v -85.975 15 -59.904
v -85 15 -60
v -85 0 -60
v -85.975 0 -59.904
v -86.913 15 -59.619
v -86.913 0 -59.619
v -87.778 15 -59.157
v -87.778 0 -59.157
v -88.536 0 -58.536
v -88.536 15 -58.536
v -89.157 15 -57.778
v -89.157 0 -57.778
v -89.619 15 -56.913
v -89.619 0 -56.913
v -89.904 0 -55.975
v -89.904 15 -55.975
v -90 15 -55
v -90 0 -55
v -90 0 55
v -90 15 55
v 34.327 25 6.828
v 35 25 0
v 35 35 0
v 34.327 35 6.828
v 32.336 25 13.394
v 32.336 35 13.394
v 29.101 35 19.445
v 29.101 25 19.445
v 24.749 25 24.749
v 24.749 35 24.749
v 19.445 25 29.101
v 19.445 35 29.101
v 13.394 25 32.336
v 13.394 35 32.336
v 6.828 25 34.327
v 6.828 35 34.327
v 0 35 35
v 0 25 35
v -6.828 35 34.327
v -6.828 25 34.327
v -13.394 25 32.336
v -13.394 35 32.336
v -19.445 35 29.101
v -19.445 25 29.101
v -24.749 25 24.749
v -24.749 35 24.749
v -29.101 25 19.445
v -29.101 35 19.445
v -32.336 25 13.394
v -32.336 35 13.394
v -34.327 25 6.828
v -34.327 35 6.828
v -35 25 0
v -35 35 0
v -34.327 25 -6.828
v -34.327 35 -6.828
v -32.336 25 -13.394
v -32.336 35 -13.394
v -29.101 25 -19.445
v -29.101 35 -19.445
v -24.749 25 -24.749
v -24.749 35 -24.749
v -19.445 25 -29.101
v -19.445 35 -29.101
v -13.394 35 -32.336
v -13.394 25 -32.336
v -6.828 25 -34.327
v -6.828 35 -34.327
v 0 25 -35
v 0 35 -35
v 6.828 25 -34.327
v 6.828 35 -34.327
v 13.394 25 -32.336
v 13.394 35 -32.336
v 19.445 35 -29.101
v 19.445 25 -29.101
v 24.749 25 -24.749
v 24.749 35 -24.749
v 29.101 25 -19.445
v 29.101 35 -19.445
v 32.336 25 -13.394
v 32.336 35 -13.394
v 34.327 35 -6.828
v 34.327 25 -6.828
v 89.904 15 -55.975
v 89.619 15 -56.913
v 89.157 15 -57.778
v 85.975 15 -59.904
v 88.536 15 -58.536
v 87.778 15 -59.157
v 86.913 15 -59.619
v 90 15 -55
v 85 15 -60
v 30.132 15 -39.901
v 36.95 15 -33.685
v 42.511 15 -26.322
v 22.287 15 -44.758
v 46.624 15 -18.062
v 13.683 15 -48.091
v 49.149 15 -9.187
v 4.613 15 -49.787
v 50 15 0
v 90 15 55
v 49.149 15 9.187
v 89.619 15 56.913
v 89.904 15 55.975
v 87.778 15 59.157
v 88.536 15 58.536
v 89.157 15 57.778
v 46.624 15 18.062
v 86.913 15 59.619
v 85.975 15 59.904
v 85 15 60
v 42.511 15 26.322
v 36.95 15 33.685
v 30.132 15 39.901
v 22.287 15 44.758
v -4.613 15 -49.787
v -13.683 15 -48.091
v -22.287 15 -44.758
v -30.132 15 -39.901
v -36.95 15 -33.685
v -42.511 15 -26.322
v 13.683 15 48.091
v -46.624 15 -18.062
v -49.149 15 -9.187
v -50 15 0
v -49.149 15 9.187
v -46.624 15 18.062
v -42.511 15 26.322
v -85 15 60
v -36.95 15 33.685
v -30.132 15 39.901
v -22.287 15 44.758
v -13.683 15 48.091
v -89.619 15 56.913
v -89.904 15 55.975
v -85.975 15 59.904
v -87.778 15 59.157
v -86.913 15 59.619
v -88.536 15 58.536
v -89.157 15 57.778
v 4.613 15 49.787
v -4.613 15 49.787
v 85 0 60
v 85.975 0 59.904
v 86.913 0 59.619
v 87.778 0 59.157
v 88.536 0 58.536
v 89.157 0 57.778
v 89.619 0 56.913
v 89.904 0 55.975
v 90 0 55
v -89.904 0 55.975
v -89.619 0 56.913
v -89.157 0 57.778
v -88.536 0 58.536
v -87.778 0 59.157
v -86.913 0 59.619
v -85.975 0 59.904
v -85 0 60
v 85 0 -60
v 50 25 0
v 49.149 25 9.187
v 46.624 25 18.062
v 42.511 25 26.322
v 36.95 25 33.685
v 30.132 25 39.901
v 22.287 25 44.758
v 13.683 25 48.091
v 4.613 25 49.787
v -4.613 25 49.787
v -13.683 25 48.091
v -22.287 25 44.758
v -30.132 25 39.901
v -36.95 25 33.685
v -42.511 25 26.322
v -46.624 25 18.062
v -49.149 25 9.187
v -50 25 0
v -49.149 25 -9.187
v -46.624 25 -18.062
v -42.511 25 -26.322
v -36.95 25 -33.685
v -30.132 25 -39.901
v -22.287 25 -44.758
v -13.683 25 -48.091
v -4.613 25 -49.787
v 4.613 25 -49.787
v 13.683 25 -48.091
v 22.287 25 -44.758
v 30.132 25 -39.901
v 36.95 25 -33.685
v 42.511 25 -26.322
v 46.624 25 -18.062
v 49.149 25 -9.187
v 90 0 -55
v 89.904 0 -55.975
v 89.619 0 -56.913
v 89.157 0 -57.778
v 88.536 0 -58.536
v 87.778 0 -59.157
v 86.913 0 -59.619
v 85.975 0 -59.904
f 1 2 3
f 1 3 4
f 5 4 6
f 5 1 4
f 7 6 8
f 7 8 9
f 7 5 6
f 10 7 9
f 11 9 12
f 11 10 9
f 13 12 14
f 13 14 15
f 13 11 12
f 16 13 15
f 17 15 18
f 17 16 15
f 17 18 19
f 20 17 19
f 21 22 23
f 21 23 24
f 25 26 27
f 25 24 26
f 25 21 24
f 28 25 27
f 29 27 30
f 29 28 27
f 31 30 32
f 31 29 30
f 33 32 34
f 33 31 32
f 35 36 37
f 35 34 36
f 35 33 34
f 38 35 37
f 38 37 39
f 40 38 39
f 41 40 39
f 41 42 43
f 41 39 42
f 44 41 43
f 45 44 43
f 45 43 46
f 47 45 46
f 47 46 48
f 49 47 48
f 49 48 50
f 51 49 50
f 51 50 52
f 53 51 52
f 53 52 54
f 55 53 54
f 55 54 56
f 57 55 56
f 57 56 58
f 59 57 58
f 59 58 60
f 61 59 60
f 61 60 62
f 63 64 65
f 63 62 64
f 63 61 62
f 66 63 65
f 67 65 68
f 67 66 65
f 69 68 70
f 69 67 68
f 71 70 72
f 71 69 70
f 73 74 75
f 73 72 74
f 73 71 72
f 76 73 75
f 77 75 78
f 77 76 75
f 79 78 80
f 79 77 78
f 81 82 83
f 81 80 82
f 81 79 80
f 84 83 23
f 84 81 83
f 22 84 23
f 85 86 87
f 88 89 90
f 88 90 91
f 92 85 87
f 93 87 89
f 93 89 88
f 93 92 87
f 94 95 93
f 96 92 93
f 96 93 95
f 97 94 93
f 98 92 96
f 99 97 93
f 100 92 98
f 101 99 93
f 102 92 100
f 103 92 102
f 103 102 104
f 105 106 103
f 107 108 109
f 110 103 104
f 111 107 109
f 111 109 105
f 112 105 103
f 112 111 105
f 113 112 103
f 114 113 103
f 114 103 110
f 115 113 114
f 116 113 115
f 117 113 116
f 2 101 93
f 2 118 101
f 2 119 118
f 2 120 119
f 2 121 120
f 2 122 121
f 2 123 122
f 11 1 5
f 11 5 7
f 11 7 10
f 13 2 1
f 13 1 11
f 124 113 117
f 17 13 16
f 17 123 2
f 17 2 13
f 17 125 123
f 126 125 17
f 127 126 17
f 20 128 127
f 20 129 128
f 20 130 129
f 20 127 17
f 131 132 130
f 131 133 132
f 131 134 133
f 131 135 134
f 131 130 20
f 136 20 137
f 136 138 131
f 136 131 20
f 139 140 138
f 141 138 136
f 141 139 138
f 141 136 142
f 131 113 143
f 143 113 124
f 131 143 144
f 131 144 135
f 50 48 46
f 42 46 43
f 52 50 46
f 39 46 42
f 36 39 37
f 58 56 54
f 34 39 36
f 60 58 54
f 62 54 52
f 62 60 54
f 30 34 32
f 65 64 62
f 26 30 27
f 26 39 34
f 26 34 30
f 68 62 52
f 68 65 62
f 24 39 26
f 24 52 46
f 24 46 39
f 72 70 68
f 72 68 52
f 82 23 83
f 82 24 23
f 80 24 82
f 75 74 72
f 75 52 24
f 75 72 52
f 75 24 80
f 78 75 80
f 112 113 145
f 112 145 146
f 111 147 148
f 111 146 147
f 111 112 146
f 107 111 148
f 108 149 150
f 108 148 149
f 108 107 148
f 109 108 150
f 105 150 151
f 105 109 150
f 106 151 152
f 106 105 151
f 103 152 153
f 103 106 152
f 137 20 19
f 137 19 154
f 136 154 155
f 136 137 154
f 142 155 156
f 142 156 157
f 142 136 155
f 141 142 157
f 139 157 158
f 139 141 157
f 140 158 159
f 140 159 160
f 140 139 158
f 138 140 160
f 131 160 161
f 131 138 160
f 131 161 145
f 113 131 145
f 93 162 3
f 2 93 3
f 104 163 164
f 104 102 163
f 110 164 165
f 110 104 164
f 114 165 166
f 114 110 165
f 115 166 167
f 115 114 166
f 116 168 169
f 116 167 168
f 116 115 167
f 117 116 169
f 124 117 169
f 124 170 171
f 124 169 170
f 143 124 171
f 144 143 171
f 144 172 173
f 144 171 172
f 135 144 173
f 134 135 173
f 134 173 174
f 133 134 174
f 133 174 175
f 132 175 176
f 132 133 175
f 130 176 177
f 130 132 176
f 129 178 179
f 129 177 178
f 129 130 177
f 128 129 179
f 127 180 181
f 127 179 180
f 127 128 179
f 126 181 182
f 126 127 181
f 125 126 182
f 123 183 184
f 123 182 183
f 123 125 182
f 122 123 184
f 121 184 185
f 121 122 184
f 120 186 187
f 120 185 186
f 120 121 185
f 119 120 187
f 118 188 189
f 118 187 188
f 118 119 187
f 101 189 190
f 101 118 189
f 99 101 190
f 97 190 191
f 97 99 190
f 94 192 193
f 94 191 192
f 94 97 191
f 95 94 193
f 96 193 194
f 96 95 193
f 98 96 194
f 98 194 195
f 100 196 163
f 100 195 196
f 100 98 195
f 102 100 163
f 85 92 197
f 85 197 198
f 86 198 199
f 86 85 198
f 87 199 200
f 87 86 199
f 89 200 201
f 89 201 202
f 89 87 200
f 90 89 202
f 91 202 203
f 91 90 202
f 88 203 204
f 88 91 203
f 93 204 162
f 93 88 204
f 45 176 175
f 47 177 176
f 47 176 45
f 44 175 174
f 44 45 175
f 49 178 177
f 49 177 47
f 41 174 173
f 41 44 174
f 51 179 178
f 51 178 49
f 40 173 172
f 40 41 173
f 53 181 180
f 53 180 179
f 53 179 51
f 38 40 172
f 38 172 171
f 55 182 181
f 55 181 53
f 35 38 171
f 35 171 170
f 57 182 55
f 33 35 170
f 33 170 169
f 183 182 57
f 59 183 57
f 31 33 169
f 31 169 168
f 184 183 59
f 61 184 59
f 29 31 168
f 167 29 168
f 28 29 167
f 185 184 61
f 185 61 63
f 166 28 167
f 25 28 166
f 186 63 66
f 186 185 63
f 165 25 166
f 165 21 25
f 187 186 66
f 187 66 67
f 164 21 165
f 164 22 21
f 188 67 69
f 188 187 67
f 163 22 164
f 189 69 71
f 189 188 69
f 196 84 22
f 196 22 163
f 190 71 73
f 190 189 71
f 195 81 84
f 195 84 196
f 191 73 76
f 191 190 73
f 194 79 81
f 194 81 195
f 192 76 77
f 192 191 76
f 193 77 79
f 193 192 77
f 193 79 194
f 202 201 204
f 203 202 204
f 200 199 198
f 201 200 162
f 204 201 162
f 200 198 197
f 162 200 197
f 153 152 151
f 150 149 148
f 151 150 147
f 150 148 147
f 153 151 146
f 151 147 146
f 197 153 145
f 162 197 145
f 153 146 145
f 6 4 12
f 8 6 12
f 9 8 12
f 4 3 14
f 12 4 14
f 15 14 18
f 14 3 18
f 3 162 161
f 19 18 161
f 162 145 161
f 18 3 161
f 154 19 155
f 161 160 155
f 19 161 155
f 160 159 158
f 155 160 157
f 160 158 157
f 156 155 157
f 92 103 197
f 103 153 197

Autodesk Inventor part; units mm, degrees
ref_plane "YZ Plane" through (0, 0, 0) normal (1, 0, 0) x (0, 1, 0)
ref_plane "XZ Plane" through (0, 0, 0) normal (0, 1, 0) x (-1, 0, 0)
ref_plane "XY Plane" through (0, 0, 0) normal (0, 0, 1) x (1, 0, 0)
sketch "Sketch1" plane through (0, 0, 0) normal (0, 1, 0) x (-1, 0, 0)
  line L0 (90, 60) -> (-90, 60)
  line L1 (-90, 60) -> (-90, -60)
  line L2 (-90, -60) -> (90, -60)
  line L3 (90, -60) -> (90, 60)
  line L4 (90, 60) -> (-90, -60) construction
  line L5 (-90, 60) -> (90, -60) construction
  point P0 (0, 0)
  dimension "d0" = 180
  dimension "d1" = 120
extrude "Extrusion1" add sketch "Sketch1" along normal blind 15
fillet "Face Fillet1" radius 5 1 edges at (90, 7.5, 60)
fillet "Face Fillet2" radius 5 1 edges at (90, 7.5, -60)
fillet "Face Fillet3" radius 5 1 edges at (-90, 7.5, -60)
fillet "Face Fillet4" radius 5 1 edges at (-90, 7.5, 60)
sketch "Sketch2" plane through (0, 15, 0) normal (0, 1, 0) x (1, 0, 0)
  circle A0 centre (0, 0) radius 50
  dimension "d8" = 100
extrude "Extrusion2" add sketch "Sketch2" along normal blind 10
sketch "Sketch3" plane through (0, 25, 0) normal (0, 1, 0) x (1, 0, 0)
  circle A0 centre (0, 0) radius 35
  dimension "d11" = 70
extrude "Extrusion3" add sketch "Sketch3" along normal blind 10
properties part number "base_of weel"
